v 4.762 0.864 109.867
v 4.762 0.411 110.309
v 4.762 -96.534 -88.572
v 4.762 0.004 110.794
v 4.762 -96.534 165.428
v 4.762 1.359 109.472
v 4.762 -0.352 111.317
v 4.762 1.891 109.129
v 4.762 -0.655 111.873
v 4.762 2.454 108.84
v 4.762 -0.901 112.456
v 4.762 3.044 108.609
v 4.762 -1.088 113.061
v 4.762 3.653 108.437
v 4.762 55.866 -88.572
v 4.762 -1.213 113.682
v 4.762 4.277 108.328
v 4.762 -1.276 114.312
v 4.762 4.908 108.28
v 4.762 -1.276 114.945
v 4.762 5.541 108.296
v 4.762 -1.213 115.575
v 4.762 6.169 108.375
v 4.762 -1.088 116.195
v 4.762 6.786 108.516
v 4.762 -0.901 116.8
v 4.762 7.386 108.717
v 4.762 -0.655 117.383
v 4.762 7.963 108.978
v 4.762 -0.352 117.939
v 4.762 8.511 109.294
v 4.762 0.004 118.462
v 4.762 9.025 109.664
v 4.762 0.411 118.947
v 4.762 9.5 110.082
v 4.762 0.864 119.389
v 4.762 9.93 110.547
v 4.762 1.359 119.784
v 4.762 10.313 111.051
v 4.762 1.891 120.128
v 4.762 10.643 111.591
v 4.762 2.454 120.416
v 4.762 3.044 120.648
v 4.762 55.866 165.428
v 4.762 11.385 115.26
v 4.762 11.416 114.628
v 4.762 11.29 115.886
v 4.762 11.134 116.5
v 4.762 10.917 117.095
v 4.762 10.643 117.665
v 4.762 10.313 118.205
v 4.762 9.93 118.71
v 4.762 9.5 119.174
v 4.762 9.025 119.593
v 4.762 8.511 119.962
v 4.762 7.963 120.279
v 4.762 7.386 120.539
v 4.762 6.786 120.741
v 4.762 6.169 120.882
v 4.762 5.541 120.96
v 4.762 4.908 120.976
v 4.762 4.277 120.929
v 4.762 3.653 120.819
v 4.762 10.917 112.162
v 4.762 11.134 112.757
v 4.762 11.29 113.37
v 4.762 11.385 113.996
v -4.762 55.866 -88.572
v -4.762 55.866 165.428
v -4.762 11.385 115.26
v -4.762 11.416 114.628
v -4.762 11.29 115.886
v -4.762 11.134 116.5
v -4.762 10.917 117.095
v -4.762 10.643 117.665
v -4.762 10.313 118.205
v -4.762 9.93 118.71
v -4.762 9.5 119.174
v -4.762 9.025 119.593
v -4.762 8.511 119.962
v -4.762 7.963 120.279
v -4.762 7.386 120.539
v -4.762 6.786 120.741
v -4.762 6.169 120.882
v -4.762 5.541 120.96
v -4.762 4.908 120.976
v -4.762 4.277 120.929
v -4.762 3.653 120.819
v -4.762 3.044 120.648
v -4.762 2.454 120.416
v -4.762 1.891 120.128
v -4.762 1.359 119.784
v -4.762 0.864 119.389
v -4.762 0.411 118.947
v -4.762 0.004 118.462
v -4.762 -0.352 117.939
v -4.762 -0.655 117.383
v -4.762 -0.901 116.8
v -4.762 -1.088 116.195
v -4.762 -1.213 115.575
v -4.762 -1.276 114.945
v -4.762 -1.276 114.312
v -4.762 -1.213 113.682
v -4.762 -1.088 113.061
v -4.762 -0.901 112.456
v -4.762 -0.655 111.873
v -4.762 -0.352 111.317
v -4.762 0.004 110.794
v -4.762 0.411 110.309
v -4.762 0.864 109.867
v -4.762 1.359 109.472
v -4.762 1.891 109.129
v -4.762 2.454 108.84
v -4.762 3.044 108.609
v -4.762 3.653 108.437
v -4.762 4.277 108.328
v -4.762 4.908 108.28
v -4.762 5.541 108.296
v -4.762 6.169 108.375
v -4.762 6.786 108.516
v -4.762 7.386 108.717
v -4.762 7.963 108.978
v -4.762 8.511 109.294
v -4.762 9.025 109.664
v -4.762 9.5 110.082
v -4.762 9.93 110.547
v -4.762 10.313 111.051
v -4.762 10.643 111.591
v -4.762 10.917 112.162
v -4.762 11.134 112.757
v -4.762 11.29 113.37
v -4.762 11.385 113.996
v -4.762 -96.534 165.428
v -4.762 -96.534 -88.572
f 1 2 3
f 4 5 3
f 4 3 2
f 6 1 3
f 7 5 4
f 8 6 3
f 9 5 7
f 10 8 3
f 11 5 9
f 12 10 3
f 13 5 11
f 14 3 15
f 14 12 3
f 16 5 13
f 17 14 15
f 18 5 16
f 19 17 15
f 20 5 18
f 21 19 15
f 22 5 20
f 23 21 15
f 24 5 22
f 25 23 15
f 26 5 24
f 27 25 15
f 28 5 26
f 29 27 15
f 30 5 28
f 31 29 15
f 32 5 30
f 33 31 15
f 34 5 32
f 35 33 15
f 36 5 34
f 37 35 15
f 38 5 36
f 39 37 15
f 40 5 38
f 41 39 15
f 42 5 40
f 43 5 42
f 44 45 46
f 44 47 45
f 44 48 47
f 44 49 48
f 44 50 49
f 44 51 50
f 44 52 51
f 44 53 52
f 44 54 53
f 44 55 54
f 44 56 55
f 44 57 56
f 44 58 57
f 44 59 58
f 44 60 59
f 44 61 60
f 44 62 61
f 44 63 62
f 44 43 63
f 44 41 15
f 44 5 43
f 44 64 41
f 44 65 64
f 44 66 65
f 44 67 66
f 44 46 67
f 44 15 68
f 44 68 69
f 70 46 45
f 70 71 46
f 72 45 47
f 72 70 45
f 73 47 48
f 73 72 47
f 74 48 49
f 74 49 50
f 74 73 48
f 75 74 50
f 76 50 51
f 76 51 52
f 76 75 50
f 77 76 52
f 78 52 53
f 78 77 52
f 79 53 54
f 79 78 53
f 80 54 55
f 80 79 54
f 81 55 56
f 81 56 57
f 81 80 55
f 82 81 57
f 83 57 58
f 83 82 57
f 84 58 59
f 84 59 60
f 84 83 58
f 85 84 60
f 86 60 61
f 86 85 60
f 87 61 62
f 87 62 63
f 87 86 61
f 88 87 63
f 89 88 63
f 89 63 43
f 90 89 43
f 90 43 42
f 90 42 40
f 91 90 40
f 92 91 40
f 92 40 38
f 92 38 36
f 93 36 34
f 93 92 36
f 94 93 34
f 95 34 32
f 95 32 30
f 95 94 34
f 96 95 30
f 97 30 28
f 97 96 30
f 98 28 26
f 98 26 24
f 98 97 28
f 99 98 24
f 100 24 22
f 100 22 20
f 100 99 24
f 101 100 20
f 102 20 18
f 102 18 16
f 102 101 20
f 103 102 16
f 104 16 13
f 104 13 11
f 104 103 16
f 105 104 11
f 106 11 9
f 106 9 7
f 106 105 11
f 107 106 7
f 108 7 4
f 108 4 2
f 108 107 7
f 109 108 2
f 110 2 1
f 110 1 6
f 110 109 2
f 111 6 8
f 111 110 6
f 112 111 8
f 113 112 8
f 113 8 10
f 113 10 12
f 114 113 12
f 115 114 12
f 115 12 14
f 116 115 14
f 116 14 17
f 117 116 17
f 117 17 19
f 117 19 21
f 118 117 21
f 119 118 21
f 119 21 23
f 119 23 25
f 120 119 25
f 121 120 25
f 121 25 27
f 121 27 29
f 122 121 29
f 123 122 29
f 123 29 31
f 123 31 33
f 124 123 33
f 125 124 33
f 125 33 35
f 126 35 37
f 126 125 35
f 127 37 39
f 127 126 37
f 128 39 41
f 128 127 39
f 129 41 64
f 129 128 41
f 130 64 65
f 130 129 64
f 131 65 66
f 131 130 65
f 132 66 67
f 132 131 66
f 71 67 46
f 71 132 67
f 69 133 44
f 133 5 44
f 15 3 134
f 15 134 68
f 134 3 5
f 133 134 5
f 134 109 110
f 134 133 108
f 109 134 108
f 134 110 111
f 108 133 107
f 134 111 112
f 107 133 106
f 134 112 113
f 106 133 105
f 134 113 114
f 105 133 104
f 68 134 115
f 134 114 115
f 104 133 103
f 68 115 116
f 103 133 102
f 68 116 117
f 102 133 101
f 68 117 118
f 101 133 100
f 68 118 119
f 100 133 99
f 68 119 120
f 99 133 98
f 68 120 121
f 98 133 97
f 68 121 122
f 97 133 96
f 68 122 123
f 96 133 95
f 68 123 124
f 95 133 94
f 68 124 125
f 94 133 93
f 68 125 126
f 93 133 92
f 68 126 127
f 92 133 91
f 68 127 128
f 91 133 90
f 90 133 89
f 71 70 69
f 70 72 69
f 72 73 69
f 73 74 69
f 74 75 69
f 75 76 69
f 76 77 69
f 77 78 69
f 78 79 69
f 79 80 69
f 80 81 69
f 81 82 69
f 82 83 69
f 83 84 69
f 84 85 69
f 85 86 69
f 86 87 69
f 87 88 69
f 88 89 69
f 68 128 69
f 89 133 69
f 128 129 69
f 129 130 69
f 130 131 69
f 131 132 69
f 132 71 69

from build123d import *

# Parameters (mm, degrees)
F0_W     = 152.4
F0_H     = 254
F0_R     = 6.35
F1_DEPTH = 4.7625


with BuildPart() as f1:
    # F0 (on Right) → F1 (new body, symmetric)
    with BuildSketch(Plane.YZ):
        with Locations((-20.3339084785, 38.4282420009)):
            Rectangle(F0_W, F0_H)
        with Locations((5.0660915215, 114.6282420009)):
            Circle(F0_R, mode=Mode.SUBTRACT)
    extrude(amount=F1_DEPTH, both=True)


solid = f1.part
